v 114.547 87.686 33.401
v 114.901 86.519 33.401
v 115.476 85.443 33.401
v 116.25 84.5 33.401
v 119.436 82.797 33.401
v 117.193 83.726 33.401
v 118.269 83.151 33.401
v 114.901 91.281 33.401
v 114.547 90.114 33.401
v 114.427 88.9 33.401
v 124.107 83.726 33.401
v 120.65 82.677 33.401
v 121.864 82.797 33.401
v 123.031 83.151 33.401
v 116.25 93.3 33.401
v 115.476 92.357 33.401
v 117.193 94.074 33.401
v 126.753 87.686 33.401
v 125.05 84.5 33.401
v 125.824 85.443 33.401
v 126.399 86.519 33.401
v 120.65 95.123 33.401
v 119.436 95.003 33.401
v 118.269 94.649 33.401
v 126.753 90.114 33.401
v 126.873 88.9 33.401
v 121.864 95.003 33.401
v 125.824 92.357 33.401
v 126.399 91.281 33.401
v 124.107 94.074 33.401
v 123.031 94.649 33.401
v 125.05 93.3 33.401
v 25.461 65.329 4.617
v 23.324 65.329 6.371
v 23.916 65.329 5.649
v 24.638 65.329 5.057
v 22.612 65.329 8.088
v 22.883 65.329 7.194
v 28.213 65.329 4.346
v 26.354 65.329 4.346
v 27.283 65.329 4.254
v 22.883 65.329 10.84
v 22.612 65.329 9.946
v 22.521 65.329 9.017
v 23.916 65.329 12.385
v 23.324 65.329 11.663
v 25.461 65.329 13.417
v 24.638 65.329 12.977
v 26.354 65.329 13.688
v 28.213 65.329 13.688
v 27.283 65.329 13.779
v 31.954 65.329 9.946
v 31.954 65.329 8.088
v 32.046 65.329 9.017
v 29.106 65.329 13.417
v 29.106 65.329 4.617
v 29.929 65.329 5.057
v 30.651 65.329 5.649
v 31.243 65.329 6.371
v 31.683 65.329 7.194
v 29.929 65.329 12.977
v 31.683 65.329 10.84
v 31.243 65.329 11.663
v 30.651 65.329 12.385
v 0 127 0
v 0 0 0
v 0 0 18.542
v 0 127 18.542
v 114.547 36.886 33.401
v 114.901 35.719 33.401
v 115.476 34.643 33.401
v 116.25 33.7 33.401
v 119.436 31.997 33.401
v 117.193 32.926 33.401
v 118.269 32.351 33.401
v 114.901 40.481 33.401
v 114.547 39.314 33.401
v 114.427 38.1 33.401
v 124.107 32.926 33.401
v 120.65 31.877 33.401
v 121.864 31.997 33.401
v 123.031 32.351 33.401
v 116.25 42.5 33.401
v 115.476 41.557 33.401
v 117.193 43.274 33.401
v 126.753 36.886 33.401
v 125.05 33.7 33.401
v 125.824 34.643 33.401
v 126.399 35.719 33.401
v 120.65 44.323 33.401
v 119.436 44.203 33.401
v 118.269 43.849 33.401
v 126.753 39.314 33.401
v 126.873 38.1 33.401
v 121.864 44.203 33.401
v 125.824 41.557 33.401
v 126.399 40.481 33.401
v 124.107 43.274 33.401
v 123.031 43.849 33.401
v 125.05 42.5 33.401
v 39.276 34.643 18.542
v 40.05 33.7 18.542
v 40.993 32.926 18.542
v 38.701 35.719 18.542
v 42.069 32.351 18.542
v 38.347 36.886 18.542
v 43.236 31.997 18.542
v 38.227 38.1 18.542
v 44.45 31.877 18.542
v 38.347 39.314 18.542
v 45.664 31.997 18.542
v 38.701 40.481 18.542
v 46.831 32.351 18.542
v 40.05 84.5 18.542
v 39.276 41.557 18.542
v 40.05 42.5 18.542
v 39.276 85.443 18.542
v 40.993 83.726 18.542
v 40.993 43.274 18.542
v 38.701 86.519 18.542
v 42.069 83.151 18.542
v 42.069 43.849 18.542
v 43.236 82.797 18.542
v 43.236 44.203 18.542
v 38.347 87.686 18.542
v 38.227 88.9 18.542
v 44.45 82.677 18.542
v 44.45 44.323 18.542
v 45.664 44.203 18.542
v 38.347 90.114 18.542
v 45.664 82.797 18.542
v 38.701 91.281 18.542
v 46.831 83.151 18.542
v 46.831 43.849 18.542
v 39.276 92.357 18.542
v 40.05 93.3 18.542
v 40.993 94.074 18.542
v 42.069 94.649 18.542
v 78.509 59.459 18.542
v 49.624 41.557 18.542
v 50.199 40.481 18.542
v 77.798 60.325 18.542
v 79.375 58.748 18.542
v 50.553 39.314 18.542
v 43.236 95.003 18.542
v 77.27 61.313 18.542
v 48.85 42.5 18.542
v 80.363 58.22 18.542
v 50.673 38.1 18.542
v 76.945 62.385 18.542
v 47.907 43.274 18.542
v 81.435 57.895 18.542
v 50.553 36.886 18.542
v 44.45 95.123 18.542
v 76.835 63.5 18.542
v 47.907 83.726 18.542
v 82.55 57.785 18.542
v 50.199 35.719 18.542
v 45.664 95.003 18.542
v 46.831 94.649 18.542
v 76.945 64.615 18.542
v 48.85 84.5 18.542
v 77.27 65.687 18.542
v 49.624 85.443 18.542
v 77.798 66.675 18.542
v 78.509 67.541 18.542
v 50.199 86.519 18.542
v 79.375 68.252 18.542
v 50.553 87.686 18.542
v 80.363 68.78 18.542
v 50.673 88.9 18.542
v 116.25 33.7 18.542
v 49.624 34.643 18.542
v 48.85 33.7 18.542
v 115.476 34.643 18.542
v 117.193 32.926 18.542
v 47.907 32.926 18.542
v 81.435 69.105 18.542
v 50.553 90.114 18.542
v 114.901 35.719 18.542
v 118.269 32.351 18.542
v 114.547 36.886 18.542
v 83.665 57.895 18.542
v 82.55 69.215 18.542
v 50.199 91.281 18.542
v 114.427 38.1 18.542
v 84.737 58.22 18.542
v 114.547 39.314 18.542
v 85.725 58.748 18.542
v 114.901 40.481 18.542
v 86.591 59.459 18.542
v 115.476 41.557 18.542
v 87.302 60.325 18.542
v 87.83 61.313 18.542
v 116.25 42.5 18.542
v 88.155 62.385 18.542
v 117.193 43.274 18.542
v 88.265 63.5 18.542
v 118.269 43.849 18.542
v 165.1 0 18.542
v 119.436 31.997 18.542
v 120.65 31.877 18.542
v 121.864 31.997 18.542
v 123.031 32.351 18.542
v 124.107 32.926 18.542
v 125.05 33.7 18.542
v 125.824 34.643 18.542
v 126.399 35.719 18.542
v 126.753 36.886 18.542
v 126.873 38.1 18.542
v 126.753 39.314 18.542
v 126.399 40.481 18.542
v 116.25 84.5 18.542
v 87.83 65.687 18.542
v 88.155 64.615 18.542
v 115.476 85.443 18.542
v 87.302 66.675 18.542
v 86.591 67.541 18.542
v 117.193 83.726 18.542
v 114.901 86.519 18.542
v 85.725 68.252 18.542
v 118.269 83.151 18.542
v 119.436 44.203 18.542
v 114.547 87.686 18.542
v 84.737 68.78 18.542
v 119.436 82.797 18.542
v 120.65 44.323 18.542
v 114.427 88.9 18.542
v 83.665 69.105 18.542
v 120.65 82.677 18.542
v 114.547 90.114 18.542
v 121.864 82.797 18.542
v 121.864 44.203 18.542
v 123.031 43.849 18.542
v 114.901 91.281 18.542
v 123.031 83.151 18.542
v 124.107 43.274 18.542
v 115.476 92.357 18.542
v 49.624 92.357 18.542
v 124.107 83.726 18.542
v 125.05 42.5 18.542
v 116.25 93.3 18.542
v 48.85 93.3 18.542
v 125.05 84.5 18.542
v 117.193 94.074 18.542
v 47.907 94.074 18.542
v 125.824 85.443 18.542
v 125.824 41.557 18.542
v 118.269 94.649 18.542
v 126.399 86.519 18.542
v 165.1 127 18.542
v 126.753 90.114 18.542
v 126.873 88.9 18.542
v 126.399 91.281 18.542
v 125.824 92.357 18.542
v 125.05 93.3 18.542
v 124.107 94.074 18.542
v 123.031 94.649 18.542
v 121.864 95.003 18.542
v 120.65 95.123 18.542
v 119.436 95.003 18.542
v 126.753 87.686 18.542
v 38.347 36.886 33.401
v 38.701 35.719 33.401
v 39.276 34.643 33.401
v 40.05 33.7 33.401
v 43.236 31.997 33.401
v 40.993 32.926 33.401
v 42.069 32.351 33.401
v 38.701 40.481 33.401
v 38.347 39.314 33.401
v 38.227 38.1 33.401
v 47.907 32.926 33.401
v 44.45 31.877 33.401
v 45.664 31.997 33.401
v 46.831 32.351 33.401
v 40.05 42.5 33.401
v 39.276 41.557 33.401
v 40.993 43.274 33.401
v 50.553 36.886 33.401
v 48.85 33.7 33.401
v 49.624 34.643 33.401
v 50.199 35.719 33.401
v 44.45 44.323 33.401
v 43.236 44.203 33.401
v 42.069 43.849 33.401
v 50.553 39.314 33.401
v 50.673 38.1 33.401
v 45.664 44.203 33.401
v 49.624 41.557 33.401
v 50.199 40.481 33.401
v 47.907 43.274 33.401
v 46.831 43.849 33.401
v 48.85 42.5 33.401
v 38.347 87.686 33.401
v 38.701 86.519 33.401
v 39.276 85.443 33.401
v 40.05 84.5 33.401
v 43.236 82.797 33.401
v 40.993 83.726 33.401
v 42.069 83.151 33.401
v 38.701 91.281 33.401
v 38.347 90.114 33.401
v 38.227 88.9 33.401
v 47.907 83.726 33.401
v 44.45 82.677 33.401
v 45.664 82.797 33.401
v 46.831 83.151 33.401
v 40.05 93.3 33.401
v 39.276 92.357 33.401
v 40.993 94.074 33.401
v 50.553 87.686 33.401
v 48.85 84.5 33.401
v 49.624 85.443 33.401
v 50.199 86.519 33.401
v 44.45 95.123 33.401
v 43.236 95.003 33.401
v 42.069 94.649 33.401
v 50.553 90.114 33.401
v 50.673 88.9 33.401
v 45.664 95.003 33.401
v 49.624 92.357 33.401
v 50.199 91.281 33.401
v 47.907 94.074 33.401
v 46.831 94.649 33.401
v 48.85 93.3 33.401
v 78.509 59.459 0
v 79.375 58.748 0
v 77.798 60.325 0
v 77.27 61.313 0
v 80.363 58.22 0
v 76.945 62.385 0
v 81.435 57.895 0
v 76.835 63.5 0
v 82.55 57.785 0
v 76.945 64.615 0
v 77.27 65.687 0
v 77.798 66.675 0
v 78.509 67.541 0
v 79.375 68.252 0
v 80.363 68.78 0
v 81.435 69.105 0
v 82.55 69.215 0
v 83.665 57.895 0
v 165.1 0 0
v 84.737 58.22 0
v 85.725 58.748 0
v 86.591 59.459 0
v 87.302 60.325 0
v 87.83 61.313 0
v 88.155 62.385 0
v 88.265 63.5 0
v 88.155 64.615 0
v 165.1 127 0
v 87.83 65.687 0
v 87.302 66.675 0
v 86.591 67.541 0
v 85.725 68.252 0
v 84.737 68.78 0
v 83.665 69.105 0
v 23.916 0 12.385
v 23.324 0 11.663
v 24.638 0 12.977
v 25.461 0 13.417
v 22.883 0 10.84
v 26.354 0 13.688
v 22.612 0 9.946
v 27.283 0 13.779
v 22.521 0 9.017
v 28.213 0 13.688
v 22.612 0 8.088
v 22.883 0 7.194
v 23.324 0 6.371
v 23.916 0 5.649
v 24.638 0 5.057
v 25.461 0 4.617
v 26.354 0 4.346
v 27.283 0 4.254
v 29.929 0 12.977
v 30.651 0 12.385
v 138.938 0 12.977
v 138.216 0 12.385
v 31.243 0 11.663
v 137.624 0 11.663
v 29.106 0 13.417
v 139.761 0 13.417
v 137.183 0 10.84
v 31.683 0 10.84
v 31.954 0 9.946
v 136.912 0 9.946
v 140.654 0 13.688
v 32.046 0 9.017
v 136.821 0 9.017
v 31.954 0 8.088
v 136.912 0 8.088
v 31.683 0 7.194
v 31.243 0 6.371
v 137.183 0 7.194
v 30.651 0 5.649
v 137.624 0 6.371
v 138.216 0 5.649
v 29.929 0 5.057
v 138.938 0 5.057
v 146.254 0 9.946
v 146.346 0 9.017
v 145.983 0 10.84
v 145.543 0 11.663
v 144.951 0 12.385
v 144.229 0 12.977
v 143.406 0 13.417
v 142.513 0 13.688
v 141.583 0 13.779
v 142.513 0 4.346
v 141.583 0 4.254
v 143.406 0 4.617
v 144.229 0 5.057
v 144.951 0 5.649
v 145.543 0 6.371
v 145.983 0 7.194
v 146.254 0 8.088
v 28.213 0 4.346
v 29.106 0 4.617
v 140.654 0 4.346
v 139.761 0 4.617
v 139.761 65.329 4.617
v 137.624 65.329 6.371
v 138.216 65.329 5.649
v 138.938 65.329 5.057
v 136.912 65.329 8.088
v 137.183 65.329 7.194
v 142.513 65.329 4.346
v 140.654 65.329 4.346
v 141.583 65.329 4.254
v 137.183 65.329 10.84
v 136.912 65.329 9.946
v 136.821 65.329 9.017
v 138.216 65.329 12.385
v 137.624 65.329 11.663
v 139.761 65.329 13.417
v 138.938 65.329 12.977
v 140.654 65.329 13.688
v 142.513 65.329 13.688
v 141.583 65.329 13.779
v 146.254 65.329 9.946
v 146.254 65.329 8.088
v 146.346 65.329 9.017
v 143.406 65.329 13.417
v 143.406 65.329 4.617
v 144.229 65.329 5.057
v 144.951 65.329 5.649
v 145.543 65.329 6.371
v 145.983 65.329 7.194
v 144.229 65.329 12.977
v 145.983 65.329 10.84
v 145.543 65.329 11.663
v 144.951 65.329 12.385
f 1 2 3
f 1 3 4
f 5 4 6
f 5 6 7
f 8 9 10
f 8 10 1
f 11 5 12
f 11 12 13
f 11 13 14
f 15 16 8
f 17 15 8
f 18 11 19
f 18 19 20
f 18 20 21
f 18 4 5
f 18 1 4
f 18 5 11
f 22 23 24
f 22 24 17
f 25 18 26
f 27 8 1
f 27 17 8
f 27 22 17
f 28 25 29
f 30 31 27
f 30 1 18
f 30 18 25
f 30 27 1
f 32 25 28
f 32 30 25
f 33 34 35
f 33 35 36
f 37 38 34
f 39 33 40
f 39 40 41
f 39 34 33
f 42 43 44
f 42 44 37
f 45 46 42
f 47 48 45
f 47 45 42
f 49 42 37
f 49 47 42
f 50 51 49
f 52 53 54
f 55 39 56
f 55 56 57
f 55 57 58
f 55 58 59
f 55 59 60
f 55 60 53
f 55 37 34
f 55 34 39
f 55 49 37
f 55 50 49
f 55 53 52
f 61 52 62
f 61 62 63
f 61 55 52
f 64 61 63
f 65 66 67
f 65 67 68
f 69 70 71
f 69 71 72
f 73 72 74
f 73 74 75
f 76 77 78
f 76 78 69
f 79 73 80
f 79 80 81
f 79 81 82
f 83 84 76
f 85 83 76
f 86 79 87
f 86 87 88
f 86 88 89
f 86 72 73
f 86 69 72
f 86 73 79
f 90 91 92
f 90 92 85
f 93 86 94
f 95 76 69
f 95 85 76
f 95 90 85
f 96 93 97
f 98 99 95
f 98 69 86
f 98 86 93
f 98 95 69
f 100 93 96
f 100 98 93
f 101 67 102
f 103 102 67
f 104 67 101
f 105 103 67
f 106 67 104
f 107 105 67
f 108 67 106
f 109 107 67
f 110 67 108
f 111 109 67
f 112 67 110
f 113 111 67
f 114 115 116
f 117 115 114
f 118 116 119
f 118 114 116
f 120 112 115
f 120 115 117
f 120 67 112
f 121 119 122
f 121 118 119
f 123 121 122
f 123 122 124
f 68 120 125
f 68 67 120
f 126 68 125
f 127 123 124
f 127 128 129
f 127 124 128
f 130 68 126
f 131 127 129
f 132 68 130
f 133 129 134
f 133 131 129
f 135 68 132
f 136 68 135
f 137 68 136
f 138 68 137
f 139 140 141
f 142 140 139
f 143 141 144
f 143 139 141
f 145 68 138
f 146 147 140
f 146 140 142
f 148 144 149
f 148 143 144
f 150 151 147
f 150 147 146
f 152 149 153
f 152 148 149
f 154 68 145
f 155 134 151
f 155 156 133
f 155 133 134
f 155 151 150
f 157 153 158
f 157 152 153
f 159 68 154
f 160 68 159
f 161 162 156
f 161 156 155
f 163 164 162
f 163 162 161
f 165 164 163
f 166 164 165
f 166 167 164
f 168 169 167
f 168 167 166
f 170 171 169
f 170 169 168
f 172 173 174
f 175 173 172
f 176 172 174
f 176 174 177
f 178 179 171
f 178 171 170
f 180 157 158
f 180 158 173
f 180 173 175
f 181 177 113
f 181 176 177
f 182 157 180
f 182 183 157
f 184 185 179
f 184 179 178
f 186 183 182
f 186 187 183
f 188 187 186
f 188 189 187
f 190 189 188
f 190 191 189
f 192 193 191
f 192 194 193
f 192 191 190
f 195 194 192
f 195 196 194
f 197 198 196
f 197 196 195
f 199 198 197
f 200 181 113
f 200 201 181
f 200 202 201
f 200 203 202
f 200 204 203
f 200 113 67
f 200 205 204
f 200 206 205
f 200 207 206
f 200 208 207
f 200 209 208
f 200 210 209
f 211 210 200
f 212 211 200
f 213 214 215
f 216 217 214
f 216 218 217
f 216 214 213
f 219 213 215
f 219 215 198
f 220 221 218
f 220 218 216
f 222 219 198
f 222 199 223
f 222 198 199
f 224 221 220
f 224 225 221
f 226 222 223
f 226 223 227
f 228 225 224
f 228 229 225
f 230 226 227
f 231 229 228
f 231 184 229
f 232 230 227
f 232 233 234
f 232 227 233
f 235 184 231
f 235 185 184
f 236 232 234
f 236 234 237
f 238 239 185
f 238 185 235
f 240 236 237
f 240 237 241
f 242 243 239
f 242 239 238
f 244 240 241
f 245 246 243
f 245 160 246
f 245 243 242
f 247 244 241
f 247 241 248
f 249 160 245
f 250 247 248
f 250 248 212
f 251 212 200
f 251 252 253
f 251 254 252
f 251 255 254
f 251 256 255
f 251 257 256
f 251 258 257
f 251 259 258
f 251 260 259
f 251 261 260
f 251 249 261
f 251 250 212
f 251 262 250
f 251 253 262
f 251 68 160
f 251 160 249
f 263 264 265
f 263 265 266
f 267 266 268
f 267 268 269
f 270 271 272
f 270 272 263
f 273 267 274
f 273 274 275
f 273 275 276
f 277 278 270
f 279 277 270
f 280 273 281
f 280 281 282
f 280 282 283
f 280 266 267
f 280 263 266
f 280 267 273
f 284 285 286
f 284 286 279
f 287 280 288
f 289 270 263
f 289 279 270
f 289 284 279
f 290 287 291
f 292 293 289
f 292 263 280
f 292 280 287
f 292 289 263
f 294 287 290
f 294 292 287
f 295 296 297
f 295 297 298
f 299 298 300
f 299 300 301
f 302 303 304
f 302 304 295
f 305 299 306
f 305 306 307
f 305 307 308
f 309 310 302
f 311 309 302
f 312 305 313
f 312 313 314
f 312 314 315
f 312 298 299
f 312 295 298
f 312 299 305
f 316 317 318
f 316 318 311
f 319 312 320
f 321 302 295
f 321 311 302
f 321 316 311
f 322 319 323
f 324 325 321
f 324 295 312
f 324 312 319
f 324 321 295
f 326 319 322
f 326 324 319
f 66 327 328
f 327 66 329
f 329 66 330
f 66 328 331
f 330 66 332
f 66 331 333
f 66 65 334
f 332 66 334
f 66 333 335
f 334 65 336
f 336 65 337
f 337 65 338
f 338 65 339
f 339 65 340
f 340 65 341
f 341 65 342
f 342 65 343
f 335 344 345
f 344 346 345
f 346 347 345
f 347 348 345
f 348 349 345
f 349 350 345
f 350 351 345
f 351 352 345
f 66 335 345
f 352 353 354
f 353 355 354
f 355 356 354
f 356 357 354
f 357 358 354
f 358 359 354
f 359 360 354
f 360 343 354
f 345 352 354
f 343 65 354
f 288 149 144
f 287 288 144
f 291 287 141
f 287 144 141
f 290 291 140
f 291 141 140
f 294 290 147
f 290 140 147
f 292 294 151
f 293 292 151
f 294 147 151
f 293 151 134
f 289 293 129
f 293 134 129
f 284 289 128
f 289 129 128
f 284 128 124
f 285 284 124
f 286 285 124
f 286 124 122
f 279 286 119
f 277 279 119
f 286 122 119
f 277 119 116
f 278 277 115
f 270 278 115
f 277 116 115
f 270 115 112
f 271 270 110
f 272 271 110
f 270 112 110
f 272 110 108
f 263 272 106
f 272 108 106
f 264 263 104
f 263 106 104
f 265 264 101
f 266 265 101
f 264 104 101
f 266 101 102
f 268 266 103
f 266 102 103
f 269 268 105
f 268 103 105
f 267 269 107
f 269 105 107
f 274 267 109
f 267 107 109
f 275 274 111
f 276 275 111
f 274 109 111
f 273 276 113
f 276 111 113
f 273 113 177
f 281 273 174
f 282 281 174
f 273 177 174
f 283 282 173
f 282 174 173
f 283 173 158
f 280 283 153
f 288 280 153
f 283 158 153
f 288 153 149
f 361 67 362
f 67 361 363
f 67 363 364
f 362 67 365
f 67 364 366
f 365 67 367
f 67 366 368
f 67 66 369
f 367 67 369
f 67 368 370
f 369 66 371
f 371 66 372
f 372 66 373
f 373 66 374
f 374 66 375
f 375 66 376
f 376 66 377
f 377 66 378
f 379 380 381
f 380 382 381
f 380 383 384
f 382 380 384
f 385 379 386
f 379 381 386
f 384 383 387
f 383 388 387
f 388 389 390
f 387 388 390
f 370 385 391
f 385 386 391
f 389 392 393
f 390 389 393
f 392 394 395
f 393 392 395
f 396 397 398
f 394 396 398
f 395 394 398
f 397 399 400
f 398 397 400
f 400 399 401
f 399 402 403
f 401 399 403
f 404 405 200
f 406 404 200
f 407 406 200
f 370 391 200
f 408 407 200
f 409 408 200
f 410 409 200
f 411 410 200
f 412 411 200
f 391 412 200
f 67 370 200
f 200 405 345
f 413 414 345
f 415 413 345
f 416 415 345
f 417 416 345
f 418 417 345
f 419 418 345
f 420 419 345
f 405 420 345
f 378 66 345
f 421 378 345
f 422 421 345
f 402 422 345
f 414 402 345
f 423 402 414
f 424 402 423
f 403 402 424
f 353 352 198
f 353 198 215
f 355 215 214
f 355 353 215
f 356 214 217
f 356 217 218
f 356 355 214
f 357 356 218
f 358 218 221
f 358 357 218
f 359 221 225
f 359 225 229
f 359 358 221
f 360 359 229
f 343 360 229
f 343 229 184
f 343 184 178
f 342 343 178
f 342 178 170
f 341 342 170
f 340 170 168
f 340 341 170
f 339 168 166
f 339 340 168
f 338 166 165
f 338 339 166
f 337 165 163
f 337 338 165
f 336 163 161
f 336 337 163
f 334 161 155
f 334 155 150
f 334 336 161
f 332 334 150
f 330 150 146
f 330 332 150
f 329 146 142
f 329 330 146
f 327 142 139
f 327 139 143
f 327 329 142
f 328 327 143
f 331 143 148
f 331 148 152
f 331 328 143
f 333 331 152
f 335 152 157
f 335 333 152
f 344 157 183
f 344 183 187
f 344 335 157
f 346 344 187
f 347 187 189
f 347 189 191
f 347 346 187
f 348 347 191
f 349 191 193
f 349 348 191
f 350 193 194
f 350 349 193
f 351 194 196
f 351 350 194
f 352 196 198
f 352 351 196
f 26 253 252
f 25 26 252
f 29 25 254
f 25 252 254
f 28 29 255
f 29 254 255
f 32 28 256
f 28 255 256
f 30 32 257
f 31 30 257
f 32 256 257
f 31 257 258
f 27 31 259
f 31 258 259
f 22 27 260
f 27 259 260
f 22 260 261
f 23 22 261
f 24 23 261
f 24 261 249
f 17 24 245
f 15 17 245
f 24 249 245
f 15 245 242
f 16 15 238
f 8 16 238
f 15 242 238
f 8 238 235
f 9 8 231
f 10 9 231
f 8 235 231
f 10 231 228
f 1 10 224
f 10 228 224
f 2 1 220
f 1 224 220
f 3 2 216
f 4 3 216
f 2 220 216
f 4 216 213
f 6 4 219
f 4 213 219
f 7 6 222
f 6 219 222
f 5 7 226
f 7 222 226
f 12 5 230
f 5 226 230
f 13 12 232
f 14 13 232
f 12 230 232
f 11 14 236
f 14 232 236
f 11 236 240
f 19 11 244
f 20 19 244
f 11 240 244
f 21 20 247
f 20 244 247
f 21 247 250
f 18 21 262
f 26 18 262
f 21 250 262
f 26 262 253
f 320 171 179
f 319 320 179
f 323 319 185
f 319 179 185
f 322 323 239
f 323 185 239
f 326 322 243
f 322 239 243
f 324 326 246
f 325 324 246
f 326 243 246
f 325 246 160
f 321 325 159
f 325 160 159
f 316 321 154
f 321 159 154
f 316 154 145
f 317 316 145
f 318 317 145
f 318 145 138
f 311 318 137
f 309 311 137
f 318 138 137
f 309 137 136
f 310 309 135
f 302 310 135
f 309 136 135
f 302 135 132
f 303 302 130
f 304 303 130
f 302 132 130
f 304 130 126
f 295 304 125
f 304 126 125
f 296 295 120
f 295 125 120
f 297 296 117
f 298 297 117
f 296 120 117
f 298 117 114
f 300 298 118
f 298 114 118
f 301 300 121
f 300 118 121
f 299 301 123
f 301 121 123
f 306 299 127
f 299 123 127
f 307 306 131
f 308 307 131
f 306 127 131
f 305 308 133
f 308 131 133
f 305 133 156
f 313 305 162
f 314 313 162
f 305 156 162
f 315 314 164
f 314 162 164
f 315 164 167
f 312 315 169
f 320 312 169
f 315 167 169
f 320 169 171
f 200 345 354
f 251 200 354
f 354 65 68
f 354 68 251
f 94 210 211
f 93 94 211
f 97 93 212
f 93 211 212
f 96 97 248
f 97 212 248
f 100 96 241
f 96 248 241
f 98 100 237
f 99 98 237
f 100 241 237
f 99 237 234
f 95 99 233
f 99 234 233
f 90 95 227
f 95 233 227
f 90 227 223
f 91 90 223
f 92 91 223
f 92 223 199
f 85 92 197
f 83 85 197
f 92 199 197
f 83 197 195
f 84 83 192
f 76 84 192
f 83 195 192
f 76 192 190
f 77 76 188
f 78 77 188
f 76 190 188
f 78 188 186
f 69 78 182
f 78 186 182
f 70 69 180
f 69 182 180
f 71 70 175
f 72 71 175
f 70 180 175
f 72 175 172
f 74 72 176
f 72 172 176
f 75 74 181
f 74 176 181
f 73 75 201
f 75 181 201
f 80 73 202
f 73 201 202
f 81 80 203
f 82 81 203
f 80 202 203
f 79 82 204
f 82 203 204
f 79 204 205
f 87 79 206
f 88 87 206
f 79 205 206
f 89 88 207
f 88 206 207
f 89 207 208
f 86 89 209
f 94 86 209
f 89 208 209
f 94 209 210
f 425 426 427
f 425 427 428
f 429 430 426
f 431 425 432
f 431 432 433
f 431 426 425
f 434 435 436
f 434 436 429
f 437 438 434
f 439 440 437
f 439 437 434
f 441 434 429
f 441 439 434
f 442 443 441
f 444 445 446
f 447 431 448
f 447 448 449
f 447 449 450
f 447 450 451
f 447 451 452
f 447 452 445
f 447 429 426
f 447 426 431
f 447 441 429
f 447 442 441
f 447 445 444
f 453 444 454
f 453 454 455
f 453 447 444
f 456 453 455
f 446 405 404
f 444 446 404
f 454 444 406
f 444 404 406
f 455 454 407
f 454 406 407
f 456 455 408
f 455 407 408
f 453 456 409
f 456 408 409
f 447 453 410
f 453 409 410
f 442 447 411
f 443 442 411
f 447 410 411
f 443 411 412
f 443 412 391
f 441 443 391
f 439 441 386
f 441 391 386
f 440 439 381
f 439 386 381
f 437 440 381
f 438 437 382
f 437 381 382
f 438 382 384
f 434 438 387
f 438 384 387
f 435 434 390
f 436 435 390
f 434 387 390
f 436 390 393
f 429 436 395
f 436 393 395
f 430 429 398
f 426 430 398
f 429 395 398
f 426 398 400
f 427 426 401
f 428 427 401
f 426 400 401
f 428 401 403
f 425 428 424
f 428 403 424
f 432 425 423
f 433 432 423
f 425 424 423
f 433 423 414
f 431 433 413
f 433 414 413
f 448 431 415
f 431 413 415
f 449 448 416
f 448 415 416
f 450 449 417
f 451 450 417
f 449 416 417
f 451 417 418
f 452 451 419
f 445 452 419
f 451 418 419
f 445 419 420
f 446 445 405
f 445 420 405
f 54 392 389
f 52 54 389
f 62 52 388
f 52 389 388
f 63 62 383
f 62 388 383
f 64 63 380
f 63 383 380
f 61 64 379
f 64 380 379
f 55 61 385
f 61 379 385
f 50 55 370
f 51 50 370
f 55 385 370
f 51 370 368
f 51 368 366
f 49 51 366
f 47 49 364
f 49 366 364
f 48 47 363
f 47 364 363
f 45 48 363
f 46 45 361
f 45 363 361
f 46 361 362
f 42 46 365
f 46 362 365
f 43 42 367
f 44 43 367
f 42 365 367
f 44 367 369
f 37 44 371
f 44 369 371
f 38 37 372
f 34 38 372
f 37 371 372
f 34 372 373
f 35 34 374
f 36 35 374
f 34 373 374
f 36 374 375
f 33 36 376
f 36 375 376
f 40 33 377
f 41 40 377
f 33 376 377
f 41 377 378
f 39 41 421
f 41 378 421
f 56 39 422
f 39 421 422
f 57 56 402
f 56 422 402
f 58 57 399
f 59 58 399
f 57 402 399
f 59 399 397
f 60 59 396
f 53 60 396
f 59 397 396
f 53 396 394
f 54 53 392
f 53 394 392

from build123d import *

# Parameters (mm, degrees)
F0_W     = 165.1
F0_H     = 127
F0_R     = 5.715
F1_DEPTH = 18.542
F2_R     = 6.223
F3_DEPTH = 14.859
F4_R     = 4.7625
F5_DEPTH = 65.3288


with BuildPart() as f1:
    # F0 (on Top) → F1 (new body)
    with BuildSketch(Plane.XY):
        with Locations((82.55, 63.5)):
            Rectangle(F0_W, F0_H)
        with Locations((82.55, 63.5)):
            Circle(F0_R, mode=Mode.SUBTRACT)
    extrude(amount=F1_DEPTH)

    # F2 (on face) → F3 (join)
    with BuildSketch(Plane.XY.offset(18.542)):
        with Locations((44.45, 88.9)):
            Circle(F2_R)
        with Locations((120.65, 88.9)):
            Circle(F2_R)
        with Locations((120.65, 38.1)):
            Circle(F2_R)
        with Locations((44.45, 38.1)):
            Circle(F2_R)
    extrude(amount=F3_DEPTH)

    # F4 (on face) → F5 (cut)
    with BuildSketch(Plane.XZ):
        with Locations((27.28341, 9.017)):
            Circle(F4_R)
        with Locations((141.58341, 9.017)):
            Circle(F4_R)
    extrude(amount=-F5_DEPTH, mode=Mode.SUBTRACT)


solid = f1.part
